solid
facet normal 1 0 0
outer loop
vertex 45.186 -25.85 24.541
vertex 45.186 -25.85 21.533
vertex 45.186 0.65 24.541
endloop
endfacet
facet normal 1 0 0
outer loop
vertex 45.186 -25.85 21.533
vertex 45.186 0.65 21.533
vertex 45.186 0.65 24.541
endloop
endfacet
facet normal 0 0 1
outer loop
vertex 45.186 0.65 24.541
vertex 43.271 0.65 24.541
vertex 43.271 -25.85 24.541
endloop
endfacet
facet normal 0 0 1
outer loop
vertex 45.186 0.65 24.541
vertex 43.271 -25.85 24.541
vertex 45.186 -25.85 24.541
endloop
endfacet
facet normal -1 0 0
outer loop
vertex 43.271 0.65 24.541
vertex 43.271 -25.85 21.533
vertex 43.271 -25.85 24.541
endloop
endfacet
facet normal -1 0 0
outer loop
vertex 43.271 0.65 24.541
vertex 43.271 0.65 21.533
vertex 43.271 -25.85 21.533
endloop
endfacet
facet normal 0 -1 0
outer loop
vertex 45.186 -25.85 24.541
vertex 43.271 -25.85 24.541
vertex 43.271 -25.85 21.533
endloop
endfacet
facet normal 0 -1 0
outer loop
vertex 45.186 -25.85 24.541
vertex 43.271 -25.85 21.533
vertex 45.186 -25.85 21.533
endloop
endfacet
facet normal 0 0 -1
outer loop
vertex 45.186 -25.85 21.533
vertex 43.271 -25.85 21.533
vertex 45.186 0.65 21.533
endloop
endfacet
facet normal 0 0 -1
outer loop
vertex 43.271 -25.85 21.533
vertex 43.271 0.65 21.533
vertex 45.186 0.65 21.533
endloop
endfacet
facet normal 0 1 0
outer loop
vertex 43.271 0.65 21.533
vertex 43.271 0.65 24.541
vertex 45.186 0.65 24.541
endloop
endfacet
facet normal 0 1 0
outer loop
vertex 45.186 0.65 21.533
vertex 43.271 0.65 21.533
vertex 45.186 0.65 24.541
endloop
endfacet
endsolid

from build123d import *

# Parameters (mm, degrees)
F2_W     = 1.9140616059
F2_H     = 3.0078124255
F3_DEPTH = 25
F4_DEPTH = 0.65
F5_DEPTH = 0.85


# Not quite as in the source:
# - the program builds the solid bodies; features that only make, move or delete a surface that nothing else refers to are left out


with BuildPart() as f3:
    # F2 (on Front) → F3 (new body)
    with BuildSketch(Plane.XZ):
        with Locations((44.2285165191, 23.0371104553)):
            Rectangle(F2_W, F2_H)
    extrude(amount=F3_DEPTH)

    # F4 (add): a face of the model
    f4_faces = [f3.faces().sort_by_distance(p)[0] for p in [
        (44.2285165191, 0, 23.0371104553),
    ]]
    extrude(f4_faces, amount=F4_DEPTH)

    # F5 (add): a face of the model
    f5_faces = [f3.faces().sort_by_distance(p)[0] for p in [
        (44.2285165191, -25, 23.0371104553),
    ]]
    extrude(f5_faces, amount=F5_DEPTH)


solid = f3.part
